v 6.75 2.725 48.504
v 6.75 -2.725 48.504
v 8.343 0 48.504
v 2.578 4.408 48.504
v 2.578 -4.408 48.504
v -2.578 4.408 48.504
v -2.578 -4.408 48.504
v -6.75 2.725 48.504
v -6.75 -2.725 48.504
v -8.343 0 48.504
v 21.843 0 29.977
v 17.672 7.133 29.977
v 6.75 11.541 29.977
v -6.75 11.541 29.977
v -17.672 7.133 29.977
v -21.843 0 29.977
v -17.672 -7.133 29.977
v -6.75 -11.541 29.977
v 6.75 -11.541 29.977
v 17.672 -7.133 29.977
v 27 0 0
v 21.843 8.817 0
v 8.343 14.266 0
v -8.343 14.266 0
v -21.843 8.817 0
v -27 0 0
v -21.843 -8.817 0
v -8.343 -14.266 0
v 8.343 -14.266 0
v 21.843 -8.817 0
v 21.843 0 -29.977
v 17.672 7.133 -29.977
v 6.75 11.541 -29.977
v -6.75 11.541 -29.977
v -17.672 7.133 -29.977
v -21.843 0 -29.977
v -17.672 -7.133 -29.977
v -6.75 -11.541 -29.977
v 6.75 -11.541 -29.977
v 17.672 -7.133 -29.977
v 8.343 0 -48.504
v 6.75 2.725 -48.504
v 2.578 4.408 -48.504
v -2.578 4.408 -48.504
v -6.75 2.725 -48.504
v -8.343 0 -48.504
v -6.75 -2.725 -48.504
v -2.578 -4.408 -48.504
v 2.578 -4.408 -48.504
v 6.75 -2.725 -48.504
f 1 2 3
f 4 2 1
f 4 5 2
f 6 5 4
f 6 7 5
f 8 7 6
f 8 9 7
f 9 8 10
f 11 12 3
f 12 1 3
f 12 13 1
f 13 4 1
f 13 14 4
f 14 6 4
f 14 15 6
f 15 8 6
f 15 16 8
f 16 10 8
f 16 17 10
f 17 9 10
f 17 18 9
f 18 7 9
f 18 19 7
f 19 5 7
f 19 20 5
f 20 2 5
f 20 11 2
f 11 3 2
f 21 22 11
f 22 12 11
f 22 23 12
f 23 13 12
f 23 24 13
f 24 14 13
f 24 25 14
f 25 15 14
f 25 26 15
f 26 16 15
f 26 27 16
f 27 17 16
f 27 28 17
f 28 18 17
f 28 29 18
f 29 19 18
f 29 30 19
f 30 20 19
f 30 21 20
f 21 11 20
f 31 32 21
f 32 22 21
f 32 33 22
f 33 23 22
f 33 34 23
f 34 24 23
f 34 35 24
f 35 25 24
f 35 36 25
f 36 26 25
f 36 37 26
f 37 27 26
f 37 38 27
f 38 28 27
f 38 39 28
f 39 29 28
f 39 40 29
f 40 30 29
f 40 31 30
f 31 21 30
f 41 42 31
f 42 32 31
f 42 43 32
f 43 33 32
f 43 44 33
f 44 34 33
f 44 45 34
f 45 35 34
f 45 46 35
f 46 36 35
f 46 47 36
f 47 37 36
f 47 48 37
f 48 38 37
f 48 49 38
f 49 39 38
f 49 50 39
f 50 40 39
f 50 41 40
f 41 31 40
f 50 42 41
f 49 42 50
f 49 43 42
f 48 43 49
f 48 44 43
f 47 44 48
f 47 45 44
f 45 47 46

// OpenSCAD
// Generated by SolidPython 1.0.1 on 2020-07-29 00:46:48


scale(v = [9, 5, 17]) {
	sphere(r = 3);
}
/***********************************************
*********      SolidPython code:      **********
************************************************
 
# import packages: SolidPython
from solid import *
from solid.utils import *
from itertools import chain, combinations, permutations


class Resize:

    def __init__(self, scad_file):
        self.scad_file = scad_file
        #self.scad_file = import_scad(scad_file)
        # cone/cylinder param:
        self.r1 = 0
        self.r2 = 0
        self.h = 0
        # rectangular prism param:
        self.w = 0
        self.l = 0
        # ellipse param:
        self.r = 0

    # import OpenScad code (file name corresponds to shape)


    # classify shape + parameters
    def assign(self, param1, param2, param3):
        if self.scad_file == 'cone.scad':
            self.r1 = param1
            self.r2 = param2
            self.h = param3
        elif self.scad_file == 'cylinder.scad':
            self.r1 = param1
            self.r2 = param2
            self.h = param3
        elif self.scad_file == 'rectangularPrism.scad':
            self.h = param1
            self.l = param2
            self.w = param3
        else:
            self.r = param1
            self.h = param2

    # resize parameters
    def iterate(self):
        x = range(3, 20, 2)
        i = 1
        if self.scad_file == 'cone.scad':
            tempList = list(permutations(x, 2))
            for temp in tempList:
                param1 = temp[0]
                param2 = temp[1]
                filepath = 'produced_scad_files/' + 'cone' + str(param1) + '_' + str(param2) + '_' + '.scad'
                scad_render_to_file(cylinder(h=param1, r1=param2, r2=0), filepath)

        elif self.scad_file == 'cylinder.scad':
            tempList = list(permutations(x, 3))
            for temp in tempList:
                param1 = temp[0]
                param2 = temp[1]
                filepath = 'produced_scad_files/' + 'cylinder' + str(param1) + '_' + str(param2) + '_' + '.scad'
                scad_render_to_file(cylinder(h=param1, r1=param2, r2=param2), filepath)

        elif self.scad_file == 'rectangularPrism.scad':
            tempList = list(permutations(x, 3))
            for temp in tempList:
                param1 = temp[0]
                param2 = temp[1]
                param3 = temp[2]
                filepath = 'produced_scad_files/' + 'rectangularPrism' + str(param1) + '_' + str(param2) + '_' + str(
                    param3) + '.scad'
                scad_render_to_file(cube(size=(param1, param2, param3)), filepath)

        elif self.scad_file == 'ellipse.scad':
            tempList = list(permutations(x, 4))
            for temp in tempList:
                param1 = temp[0]
                param2 = temp[1]
                param3 = temp[2]
                param4 = temp[3]
                filepath = 'produced_scad_files/' + 'ellipse' + str(param1) + '_' + str(param2) + '_' + str(param3) + '_' + str(param4) + '.scad'
                scad_render_to_file(scale([param1, param2, param3])(sphere(r=param4)), filepath)

    def render_to_scadfile(self):
        scad_render_to_file(scad, 'example.scad') 
 
************************************************/
